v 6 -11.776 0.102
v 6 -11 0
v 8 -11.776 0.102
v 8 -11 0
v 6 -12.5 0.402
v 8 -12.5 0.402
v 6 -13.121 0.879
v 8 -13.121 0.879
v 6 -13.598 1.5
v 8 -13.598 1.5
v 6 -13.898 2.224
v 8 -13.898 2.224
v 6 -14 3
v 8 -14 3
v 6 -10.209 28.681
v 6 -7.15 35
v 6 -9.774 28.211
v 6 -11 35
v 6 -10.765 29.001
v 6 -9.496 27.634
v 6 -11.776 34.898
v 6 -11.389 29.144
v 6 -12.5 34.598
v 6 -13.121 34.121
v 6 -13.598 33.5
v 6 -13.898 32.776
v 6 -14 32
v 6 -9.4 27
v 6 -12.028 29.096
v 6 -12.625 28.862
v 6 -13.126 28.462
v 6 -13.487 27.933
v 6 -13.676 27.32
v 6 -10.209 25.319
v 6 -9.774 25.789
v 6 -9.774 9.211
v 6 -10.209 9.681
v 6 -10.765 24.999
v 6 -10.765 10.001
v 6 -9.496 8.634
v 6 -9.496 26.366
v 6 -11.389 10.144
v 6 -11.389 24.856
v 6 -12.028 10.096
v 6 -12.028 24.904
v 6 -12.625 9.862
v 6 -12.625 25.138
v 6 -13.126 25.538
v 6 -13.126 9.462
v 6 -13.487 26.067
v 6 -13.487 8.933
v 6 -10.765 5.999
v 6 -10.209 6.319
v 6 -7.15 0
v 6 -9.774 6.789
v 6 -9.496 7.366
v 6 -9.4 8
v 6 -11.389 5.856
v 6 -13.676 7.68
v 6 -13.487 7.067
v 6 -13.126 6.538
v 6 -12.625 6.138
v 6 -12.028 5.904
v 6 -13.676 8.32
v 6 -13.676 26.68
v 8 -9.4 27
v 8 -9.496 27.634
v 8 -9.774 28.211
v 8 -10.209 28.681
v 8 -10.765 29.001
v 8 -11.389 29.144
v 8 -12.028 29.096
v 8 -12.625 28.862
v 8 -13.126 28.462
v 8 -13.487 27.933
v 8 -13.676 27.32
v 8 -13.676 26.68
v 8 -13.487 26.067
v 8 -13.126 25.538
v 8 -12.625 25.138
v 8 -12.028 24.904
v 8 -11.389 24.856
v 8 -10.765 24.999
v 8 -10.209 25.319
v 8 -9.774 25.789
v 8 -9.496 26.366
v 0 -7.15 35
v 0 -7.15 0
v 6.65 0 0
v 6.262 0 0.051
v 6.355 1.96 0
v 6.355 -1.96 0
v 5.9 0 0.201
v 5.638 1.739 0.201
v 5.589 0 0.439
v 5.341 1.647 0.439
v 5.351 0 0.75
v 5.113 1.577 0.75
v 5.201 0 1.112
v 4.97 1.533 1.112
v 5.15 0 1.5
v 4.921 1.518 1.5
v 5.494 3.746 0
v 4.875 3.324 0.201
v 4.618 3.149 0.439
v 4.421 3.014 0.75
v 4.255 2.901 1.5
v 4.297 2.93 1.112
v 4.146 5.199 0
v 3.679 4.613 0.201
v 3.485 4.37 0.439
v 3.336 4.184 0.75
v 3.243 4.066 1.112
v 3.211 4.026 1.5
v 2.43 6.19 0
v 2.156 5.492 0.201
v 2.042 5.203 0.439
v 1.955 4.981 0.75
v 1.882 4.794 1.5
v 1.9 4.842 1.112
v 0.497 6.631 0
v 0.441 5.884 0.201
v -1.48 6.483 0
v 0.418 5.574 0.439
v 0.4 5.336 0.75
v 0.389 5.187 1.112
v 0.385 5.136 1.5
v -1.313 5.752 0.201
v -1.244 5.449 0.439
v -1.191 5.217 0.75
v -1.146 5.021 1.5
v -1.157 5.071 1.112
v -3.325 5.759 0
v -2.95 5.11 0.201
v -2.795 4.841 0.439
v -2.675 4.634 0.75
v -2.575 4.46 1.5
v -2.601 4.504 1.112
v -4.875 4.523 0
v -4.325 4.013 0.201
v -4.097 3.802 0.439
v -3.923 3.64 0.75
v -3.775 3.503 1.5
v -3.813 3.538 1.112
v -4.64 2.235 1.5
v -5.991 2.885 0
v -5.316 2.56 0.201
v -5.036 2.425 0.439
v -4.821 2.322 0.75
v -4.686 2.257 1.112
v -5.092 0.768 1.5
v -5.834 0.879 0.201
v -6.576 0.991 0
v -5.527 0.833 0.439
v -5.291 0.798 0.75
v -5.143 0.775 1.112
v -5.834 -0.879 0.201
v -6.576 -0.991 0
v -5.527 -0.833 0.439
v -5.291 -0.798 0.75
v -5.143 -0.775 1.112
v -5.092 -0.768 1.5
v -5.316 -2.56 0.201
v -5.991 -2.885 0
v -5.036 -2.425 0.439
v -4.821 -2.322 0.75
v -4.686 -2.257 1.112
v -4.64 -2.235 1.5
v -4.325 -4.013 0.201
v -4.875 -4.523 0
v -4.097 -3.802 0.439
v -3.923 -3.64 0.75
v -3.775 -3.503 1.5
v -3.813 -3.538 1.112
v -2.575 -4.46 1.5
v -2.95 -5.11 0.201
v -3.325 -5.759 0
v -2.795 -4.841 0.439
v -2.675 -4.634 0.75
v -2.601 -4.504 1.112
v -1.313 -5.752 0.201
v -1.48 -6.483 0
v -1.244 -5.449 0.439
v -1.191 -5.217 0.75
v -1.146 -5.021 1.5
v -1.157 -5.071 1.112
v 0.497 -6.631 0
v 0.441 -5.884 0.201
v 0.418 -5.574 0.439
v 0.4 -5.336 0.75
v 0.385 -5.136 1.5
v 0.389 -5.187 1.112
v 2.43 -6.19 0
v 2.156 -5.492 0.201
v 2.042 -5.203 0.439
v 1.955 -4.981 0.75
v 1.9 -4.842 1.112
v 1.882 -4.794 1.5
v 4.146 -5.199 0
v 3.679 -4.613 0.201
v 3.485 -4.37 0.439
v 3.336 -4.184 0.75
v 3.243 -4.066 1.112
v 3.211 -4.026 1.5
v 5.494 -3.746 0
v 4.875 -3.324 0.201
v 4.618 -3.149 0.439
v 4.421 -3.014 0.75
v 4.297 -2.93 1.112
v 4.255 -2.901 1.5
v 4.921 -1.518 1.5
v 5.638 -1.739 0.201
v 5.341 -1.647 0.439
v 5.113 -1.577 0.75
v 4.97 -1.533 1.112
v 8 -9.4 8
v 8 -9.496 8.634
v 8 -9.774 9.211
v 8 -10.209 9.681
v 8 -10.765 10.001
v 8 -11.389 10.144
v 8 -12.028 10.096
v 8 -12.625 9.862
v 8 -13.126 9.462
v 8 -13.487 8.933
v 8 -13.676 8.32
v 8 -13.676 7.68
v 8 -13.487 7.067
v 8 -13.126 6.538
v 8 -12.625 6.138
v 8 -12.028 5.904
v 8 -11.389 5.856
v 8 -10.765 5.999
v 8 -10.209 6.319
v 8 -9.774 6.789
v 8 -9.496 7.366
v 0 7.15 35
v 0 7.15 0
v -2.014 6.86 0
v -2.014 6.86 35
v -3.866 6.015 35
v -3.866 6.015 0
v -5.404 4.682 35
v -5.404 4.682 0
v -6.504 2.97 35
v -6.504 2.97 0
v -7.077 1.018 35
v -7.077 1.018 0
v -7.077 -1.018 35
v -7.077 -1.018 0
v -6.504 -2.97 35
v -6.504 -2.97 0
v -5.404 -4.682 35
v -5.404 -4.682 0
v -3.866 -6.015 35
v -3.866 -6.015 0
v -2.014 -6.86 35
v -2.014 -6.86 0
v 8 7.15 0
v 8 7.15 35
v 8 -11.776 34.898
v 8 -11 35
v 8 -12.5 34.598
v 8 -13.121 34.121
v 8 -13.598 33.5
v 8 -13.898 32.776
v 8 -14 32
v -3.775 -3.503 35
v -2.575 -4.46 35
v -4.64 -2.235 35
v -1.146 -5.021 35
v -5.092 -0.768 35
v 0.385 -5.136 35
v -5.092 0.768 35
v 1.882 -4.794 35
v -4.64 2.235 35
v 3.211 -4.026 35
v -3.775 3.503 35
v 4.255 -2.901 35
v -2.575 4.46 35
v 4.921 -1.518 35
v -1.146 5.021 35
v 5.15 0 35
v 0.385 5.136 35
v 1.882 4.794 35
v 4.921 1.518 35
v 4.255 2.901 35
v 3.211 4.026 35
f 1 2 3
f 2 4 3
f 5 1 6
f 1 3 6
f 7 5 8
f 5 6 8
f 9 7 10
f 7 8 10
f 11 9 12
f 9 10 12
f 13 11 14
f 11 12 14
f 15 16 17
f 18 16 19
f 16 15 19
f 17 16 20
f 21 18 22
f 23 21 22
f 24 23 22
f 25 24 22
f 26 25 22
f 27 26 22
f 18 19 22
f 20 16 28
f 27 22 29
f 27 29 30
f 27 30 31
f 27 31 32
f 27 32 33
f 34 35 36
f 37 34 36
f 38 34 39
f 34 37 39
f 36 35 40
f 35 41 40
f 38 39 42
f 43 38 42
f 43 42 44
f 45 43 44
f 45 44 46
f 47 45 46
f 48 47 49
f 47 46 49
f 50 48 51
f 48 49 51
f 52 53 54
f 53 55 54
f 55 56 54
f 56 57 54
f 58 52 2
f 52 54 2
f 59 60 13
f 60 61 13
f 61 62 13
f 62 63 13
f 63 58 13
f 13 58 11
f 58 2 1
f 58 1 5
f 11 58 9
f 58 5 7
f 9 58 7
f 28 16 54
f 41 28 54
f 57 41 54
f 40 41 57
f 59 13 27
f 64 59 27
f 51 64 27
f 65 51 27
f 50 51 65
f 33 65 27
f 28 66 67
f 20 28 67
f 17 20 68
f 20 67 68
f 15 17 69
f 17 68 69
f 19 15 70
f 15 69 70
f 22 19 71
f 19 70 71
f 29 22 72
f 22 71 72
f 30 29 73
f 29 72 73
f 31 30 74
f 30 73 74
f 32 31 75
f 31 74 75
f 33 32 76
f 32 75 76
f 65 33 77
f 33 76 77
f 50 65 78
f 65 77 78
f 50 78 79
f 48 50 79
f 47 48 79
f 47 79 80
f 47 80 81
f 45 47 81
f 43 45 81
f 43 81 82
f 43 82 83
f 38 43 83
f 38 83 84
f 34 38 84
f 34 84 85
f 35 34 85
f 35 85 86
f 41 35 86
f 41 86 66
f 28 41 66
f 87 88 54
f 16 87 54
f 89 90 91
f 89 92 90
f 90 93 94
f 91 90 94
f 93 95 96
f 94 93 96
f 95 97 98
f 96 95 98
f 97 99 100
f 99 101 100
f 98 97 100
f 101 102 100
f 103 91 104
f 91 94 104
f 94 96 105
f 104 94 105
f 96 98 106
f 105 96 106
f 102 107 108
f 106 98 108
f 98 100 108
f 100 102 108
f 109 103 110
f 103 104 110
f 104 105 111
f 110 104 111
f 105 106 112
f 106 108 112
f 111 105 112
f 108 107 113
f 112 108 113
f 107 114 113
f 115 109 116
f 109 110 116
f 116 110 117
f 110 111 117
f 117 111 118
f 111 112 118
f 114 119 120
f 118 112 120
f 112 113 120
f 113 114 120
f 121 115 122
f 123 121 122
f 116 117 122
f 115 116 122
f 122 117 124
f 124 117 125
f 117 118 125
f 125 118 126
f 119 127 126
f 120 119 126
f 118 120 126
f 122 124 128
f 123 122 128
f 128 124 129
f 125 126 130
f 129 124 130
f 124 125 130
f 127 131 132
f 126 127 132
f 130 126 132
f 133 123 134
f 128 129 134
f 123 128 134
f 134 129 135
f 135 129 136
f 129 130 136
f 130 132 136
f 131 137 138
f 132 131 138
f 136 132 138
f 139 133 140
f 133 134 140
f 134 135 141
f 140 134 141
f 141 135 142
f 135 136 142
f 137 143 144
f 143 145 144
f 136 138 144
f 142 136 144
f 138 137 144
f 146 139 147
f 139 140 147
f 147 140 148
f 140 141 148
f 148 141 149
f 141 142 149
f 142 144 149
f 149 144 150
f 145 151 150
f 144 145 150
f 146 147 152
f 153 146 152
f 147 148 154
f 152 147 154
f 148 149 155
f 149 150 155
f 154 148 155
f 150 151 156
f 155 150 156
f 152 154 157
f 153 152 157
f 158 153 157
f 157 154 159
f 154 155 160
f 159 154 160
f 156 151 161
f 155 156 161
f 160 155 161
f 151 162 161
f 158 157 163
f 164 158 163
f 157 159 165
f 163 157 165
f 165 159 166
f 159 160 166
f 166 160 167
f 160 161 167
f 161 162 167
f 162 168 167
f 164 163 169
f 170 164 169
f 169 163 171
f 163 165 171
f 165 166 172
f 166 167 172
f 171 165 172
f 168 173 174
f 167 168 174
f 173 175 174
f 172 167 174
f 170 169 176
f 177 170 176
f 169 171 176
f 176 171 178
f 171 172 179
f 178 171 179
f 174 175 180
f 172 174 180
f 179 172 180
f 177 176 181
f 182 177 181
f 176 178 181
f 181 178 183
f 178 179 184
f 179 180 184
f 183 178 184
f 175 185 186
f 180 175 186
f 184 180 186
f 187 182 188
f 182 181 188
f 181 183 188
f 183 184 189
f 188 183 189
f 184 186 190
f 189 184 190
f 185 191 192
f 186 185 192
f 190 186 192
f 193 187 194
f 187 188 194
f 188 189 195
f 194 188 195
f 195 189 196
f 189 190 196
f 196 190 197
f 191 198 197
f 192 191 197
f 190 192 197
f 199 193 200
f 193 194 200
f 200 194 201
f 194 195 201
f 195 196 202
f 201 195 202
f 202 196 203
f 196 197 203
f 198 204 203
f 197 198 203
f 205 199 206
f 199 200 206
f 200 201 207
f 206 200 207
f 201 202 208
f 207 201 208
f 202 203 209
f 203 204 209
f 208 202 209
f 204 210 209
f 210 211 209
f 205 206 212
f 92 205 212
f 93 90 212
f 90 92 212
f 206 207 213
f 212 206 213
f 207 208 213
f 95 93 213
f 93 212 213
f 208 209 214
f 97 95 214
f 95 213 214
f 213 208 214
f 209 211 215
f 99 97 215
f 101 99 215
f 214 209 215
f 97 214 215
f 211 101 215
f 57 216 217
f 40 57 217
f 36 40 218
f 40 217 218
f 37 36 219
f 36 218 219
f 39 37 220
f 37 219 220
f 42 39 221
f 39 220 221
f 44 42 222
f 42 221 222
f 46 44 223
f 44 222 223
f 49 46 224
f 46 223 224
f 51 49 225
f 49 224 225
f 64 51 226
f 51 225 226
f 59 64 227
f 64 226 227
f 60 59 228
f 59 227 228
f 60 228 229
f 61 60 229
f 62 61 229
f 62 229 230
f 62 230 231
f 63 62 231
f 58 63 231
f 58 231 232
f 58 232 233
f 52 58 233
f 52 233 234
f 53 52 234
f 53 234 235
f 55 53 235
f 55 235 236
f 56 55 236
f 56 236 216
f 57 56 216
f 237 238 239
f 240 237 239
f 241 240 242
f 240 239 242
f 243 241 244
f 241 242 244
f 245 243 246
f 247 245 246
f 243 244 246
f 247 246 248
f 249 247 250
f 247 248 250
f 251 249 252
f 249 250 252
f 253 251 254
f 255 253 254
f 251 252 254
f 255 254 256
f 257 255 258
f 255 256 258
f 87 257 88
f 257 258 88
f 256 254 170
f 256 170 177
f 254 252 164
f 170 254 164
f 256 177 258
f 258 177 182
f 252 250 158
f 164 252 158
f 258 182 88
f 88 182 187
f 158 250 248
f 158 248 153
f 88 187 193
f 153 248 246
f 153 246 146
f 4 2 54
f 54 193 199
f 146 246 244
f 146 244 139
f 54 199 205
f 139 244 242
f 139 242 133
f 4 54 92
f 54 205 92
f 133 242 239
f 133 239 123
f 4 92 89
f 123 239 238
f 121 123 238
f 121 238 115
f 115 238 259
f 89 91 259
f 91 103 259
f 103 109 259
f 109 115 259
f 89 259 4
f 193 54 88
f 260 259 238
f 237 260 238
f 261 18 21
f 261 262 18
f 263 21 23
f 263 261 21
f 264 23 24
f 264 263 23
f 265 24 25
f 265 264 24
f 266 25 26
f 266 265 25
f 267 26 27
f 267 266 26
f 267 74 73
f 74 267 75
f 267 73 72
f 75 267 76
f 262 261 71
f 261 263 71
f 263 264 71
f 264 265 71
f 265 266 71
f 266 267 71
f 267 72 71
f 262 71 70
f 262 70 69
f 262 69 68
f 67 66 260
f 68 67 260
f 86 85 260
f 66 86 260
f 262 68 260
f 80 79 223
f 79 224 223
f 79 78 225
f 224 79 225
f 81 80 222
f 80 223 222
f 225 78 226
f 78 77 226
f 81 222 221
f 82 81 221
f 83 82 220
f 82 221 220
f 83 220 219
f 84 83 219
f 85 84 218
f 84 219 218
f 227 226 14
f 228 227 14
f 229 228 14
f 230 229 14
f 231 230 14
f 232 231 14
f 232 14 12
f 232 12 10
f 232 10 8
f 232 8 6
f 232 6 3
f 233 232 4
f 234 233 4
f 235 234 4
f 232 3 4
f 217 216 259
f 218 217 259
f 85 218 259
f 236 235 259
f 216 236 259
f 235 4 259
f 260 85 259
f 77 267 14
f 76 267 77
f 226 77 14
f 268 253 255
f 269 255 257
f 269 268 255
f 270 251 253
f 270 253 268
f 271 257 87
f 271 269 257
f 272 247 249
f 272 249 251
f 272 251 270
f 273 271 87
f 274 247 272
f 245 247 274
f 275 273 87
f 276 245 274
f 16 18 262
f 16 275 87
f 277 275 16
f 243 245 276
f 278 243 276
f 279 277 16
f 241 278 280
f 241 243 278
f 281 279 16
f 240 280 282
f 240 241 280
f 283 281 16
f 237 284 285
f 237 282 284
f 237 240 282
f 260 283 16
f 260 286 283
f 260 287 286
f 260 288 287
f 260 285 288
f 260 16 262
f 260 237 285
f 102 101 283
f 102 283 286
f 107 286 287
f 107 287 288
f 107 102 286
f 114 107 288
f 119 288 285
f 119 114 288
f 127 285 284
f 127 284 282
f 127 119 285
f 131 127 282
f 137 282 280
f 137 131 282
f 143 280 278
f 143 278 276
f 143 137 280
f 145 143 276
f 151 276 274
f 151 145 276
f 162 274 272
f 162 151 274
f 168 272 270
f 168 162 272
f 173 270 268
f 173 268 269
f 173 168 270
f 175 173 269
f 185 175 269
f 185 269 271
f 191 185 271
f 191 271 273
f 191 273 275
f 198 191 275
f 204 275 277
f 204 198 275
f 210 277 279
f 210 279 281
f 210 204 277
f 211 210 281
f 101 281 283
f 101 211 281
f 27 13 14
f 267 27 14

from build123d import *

# Parameters (mm, degrees)
F0_R     = 5.15
F1_DEPTH = 35
F3_D     = 4.3
F4_R     = 3
F5_R     = 1.5


with BuildPart() as f1:
    # F0 (on Top) → F1 (new body)
    with BuildSketch(Plane.XY):
        with BuildLine():
            ThreePointArc((0, -7.15), (5.055813, -5.055813), (7.15, 0))
            ThreePointArc((7.15, 0), (5.055813, 5.055813), (0, 7.15))
            ThreePointArc((0, 7.15), (-7.15, 0), (0, -7.15))
        make_face()
        Circle(F0_R, mode=Mode.SUBTRACT)
        with BuildLine():
            Line((8, 0), (7.15, 0))
            ThreePointArc((7.15, 0), (5.055813, -5.055813), (0, -7.15))
            Line((0, -7.15), (6, -7.15))
            Line((6, -7.15), (6, -14))
            Line((6, -14), (8, -14))
            Line((8, -14), (8, 0))
        make_face()
        with BuildLine():
            ThreePointArc((0, 7.15), (5.055813, 5.055813), (7.15, 0))
            Line((7.15, 0), (8, 0))
            Line((8, 0), (8, 7.15))
            Line((8, 7.15), (0, 7.15))
        make_face()
    extrude(amount=F1_DEPTH)

    # F3 (through all)
    with Locations(Plane(origin=(6, 0, 0), x_dir=(0, -1, 0), z_dir=(-1, 0, 0))):
        with Locations((11.55, 8), (11.55, 27)):
            Hole(F3_D / 2)

    # F4
    f4_edges = [f1.edges().sort_by_distance(p)[0] for p in [
        (7, -14, 0),
        (7, -14, 35),
    ]]
    fillet(f4_edges, radius=F4_R)

    # F5
    f5_edges = [f1.edges().sort_by_distance(p)[0] for p in [
        (-5.15, 0, 0),
    ]]
    fillet(f5_edges, radius=F5_R)


solid = f1.part
